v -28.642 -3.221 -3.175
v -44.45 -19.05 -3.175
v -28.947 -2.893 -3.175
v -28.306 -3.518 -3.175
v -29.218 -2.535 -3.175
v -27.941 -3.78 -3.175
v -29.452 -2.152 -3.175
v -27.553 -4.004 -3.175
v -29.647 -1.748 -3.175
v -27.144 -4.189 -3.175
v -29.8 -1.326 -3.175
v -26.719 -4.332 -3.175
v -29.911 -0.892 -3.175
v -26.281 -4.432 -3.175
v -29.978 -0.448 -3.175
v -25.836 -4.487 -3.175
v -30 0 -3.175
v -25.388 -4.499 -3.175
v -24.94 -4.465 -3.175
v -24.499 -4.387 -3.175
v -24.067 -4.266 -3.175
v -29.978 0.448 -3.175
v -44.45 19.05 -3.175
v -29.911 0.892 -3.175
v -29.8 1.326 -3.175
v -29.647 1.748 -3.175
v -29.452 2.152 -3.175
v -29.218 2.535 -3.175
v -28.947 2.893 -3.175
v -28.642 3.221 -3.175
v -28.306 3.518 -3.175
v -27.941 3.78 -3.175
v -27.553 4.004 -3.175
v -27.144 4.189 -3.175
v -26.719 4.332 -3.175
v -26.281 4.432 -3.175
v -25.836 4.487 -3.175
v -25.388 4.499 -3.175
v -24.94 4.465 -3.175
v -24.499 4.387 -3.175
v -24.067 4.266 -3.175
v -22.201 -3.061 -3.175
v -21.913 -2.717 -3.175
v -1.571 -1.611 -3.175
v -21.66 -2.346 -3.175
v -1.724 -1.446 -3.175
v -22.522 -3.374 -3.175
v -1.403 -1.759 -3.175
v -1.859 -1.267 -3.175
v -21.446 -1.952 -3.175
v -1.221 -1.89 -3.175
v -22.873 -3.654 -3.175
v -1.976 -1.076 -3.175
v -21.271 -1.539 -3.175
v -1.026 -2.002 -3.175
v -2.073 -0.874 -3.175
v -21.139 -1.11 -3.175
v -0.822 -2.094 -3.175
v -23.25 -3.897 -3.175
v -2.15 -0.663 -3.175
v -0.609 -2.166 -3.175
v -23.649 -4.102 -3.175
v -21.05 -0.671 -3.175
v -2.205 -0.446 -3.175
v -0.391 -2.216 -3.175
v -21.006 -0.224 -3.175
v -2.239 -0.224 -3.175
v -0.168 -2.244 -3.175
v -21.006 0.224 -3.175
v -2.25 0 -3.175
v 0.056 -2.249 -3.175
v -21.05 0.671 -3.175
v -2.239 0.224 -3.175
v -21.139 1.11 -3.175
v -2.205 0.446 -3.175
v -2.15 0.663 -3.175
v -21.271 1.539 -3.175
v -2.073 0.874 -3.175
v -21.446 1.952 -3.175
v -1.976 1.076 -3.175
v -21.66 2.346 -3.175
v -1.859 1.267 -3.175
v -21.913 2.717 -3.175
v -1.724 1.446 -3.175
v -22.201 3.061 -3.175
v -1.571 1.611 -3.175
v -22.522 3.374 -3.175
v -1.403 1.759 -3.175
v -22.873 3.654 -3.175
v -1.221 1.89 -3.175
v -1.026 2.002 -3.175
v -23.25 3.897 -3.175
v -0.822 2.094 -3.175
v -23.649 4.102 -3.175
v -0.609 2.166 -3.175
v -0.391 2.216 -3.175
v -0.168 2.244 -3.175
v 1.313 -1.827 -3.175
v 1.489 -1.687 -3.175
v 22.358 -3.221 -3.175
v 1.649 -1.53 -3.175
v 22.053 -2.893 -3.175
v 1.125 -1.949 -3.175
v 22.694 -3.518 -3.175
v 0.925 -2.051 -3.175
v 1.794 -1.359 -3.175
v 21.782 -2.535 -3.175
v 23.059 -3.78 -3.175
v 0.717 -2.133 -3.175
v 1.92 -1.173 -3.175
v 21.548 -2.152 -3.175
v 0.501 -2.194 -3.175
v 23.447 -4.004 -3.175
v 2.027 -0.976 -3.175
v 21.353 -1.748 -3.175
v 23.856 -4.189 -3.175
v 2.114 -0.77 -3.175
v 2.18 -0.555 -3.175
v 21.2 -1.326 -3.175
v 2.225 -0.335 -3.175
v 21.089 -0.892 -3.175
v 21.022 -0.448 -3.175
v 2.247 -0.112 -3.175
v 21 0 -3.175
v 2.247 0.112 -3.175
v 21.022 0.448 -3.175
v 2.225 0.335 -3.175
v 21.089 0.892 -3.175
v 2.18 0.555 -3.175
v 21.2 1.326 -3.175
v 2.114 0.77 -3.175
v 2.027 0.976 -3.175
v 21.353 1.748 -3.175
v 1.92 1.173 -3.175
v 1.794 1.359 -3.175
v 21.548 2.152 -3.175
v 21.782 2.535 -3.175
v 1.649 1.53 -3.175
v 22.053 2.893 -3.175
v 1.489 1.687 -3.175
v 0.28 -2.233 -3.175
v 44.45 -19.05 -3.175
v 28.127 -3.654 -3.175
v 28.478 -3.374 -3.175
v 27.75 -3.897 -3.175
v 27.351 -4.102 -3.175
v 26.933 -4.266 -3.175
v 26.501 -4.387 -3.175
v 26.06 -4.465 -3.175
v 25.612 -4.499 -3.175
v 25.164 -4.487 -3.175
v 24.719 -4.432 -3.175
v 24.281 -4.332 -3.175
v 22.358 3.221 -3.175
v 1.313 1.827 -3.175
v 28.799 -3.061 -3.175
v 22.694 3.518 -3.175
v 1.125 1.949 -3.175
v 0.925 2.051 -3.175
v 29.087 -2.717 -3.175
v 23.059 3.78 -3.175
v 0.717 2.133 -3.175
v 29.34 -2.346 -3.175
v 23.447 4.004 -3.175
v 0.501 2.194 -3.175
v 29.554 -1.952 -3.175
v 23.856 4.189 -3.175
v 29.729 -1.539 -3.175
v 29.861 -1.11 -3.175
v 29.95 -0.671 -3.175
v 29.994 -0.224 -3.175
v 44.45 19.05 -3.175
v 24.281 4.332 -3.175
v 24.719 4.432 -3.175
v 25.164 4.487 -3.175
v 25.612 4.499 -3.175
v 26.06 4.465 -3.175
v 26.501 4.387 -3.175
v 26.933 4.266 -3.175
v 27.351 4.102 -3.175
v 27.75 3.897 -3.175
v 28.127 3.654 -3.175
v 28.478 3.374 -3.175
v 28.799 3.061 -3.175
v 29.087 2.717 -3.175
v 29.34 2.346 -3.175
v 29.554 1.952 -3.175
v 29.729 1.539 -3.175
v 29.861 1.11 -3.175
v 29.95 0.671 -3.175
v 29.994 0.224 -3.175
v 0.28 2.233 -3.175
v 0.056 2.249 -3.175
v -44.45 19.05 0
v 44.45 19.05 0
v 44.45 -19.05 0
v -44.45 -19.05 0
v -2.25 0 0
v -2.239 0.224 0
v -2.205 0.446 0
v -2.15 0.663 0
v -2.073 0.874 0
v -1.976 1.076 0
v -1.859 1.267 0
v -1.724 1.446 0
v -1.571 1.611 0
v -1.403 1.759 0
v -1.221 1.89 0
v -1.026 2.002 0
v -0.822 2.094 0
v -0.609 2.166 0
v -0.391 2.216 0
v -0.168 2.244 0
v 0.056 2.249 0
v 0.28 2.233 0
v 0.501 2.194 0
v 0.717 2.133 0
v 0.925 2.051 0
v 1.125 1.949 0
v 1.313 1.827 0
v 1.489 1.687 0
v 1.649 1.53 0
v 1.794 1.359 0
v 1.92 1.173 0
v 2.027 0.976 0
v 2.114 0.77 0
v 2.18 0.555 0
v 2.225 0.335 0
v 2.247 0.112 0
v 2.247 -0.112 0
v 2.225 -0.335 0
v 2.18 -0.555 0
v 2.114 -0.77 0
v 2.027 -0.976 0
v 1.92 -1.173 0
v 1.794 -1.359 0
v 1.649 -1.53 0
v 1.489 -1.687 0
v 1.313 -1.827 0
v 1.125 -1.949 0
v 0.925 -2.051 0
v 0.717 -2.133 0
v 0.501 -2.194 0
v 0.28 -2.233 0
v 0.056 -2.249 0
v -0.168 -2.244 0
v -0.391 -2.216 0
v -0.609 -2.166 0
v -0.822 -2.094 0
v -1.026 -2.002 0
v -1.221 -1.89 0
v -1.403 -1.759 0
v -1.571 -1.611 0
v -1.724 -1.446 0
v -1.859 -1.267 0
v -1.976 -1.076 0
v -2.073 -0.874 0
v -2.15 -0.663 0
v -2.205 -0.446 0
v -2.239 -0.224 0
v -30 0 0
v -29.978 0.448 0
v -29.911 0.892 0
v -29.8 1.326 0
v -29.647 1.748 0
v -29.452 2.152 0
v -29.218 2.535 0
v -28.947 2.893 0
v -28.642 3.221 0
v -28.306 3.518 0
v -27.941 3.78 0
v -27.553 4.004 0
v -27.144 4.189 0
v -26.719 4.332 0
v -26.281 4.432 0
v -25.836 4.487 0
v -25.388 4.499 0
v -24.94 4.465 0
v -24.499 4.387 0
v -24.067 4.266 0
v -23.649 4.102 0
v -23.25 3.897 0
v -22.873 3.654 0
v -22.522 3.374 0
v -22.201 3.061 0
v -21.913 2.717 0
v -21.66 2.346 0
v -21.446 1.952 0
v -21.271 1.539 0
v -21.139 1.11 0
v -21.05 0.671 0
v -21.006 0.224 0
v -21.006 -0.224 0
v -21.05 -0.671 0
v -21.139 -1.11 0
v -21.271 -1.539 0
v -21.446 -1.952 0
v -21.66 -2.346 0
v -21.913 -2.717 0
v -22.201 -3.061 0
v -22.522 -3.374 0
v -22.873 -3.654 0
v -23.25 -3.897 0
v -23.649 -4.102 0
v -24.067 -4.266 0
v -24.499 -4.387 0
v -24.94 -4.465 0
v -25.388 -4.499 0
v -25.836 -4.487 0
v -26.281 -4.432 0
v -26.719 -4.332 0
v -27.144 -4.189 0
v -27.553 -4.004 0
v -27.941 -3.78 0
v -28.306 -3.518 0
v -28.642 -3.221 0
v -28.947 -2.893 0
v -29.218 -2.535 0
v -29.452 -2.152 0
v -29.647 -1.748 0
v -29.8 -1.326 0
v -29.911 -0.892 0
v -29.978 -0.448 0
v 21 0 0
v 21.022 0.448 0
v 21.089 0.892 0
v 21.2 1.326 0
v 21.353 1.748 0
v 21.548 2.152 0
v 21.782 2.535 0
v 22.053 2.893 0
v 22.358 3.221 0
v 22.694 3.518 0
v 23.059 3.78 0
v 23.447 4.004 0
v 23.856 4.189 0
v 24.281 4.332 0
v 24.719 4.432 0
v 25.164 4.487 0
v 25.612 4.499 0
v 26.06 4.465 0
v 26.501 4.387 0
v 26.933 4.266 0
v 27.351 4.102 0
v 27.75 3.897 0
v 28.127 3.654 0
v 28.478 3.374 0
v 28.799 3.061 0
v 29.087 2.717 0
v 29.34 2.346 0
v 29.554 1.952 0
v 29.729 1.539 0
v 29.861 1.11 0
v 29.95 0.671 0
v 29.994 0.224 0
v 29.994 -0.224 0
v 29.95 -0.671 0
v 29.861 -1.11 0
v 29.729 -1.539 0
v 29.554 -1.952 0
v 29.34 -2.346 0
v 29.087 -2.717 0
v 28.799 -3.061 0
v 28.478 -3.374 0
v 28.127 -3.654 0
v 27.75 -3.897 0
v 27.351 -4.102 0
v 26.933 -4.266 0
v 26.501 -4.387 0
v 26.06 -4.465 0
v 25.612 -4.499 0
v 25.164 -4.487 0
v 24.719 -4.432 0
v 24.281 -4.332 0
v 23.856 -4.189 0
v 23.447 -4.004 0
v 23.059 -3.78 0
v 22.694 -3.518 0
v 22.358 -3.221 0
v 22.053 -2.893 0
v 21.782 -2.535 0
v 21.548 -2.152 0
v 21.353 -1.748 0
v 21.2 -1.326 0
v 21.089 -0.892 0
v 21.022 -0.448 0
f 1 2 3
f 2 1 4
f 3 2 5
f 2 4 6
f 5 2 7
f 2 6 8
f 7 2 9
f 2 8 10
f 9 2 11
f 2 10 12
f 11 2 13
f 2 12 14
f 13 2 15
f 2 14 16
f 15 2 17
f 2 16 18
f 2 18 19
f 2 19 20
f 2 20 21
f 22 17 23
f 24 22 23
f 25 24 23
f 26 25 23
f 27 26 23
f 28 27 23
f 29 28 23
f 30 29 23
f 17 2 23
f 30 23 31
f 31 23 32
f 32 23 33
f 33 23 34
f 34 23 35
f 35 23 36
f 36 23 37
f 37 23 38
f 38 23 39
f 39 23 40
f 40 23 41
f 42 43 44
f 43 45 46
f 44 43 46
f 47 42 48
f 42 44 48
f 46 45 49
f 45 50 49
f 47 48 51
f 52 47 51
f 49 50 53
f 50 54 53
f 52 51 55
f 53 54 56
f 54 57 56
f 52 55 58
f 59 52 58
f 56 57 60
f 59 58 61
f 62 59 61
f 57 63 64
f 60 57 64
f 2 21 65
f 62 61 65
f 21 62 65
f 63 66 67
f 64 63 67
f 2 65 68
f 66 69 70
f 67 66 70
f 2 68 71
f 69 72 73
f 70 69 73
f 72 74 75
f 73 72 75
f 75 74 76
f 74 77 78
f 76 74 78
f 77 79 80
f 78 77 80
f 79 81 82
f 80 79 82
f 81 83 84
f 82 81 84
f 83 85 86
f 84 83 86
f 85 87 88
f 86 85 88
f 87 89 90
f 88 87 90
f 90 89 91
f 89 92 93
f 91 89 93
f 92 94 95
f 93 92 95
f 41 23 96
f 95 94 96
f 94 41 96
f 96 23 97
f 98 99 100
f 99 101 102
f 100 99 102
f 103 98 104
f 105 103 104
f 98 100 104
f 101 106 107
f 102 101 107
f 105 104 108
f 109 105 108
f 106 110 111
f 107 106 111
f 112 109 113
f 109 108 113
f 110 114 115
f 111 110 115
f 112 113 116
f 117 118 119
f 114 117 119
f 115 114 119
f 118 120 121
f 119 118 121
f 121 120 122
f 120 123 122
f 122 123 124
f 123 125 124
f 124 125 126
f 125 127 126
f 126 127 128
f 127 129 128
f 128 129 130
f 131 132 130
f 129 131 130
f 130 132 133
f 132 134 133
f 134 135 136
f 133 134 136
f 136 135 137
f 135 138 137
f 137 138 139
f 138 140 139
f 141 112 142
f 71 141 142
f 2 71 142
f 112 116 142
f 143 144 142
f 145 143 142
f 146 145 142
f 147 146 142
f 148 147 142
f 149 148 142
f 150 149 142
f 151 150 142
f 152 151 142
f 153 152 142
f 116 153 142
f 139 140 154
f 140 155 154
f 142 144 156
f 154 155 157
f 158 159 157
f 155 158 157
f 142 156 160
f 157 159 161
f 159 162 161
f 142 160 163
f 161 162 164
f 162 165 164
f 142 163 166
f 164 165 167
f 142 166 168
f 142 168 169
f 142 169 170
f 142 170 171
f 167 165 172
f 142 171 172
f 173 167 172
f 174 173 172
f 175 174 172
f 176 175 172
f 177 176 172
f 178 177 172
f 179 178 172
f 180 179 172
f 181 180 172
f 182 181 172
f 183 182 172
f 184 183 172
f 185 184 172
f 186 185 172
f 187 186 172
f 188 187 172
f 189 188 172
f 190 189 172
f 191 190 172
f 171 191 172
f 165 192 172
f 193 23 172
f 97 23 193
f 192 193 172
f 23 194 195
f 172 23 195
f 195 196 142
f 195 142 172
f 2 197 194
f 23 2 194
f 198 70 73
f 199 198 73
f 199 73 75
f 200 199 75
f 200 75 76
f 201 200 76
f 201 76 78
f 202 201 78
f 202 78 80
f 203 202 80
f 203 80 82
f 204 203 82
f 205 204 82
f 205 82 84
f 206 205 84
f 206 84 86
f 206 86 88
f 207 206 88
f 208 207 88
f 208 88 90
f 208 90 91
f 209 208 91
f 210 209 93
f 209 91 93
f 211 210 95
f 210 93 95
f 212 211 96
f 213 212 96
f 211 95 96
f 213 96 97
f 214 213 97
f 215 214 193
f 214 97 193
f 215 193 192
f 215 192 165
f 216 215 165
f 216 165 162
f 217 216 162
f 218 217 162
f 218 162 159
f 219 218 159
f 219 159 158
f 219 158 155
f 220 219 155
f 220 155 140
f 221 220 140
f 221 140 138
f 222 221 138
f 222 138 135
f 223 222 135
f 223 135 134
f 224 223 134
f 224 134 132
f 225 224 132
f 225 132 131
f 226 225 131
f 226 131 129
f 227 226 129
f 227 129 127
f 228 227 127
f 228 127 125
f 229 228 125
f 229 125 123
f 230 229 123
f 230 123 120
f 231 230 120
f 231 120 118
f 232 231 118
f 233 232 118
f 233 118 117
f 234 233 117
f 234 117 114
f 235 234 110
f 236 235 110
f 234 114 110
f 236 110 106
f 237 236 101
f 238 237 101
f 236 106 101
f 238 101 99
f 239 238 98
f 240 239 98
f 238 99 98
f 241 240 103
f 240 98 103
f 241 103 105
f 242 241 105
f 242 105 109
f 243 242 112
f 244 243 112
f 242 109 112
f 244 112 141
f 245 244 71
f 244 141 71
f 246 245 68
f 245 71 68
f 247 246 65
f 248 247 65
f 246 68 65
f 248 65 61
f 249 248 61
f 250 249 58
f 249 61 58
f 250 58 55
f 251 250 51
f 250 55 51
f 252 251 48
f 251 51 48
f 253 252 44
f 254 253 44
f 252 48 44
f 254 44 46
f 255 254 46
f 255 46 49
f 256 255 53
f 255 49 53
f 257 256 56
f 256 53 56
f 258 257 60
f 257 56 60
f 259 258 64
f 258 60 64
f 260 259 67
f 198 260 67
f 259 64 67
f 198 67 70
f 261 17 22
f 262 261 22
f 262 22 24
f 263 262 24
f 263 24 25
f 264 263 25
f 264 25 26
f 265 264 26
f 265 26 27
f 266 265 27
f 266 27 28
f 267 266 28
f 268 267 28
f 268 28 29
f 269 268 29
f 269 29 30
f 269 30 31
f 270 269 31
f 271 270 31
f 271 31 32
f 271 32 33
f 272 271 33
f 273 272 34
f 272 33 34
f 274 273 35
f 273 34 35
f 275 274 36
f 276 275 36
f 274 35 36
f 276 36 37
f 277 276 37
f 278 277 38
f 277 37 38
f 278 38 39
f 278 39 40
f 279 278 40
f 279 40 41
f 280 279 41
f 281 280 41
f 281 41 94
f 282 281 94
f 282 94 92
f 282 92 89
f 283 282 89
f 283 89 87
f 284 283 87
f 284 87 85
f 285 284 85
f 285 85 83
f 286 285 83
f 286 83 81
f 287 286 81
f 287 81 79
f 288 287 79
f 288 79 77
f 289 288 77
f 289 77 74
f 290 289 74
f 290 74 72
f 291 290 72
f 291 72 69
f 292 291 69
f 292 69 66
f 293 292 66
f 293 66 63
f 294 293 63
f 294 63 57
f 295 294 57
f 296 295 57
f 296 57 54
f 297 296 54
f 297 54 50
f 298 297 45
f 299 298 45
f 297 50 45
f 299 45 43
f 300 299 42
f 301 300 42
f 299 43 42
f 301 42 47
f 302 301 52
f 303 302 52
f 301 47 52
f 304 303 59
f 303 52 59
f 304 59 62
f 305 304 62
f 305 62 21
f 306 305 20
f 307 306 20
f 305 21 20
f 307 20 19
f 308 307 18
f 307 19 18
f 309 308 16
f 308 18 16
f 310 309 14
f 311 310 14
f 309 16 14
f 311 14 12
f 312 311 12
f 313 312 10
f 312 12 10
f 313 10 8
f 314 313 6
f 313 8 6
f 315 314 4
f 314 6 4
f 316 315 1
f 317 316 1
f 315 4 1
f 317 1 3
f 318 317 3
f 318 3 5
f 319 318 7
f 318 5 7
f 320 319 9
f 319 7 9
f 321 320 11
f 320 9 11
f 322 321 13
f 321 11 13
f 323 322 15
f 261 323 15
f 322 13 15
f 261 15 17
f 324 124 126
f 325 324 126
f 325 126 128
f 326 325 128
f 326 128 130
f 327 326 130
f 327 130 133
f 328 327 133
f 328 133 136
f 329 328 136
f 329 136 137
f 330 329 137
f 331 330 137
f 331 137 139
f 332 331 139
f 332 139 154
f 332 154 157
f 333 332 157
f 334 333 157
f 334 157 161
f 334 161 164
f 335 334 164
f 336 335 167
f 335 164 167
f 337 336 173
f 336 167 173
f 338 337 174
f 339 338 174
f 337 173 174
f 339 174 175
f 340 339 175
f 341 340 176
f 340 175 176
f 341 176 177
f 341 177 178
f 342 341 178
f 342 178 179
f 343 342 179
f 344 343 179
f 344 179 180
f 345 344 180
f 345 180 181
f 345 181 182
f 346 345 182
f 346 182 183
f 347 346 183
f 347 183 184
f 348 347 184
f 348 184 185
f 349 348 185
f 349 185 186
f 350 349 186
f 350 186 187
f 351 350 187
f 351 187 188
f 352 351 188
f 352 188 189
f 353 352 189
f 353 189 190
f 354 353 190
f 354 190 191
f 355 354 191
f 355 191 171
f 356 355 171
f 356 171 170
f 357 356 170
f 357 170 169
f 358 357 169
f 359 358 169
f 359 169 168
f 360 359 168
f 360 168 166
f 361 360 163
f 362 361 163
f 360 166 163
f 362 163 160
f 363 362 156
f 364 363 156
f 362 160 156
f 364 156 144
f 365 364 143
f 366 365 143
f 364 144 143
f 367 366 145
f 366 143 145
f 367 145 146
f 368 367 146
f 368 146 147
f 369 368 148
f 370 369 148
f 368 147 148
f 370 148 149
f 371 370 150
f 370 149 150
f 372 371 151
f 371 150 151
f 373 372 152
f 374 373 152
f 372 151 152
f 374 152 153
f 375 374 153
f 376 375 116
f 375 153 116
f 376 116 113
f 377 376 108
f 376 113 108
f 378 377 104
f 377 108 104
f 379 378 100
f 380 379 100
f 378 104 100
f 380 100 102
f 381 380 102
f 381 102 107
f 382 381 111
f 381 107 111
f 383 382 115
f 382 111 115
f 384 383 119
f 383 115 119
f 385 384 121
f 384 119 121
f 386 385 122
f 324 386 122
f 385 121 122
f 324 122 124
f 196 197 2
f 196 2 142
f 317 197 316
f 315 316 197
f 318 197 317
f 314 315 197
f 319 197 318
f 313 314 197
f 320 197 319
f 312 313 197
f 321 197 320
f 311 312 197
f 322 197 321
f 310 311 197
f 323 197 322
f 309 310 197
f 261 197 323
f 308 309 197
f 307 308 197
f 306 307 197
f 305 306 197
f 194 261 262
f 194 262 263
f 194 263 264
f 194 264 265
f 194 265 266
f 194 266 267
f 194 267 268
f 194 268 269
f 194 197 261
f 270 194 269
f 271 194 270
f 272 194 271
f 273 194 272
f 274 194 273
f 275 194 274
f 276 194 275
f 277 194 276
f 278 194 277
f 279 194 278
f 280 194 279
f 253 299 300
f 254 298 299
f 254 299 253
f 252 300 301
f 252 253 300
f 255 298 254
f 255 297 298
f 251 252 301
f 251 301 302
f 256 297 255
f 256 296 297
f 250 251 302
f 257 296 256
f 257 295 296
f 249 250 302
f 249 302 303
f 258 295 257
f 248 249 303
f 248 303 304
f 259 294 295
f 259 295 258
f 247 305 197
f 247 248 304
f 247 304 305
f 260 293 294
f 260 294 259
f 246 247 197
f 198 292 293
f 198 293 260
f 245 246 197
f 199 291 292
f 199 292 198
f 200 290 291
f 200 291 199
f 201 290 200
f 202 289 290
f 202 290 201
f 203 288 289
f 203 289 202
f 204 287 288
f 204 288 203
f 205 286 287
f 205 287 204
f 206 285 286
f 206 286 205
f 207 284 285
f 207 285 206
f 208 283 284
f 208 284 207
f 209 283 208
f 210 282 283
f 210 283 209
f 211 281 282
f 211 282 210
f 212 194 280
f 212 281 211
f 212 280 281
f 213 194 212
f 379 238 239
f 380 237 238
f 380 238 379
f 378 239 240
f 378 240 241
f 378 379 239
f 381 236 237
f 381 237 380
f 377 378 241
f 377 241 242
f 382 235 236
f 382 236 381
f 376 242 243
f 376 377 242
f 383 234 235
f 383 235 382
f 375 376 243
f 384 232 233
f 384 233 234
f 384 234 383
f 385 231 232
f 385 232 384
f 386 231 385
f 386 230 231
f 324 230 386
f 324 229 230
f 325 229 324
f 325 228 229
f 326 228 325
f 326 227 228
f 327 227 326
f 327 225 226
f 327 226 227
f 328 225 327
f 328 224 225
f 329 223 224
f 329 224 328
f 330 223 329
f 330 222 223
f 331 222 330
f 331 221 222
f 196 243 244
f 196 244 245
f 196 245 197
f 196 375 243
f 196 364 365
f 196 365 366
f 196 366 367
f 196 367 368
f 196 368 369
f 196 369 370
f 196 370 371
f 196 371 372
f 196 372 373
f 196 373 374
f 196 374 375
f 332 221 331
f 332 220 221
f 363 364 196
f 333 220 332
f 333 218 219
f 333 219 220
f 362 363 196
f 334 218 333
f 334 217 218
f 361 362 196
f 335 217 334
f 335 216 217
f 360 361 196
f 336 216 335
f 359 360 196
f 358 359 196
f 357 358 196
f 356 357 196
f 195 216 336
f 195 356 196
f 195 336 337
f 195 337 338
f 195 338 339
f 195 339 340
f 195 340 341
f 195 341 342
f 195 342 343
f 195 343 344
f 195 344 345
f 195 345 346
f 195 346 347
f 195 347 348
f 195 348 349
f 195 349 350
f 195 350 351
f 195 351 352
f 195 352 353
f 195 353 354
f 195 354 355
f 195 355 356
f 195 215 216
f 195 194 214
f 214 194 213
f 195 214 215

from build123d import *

# Parameters (mm, degrees)
SKETCH1_W            = 88.9
SKETCH1_H            = 38.1
BOSS_EXTRUDE1_DEPTH  = 3.175
M4_CLEARANCE_HOLE1_D = 4.5
M8_CLEARANCE_HOLE1_D = 9


with BuildPart() as part:
    # Sketch1 → Boss-Extrude1 (new body)
    with BuildSketch(Plane.XY):
        Rectangle(SKETCH1_W, SKETCH1_H)
    extrude(amount=-BOSS_EXTRUDE1_DEPTH)

    # M4 Clearance Hole1 (through all)
    with Locations(Plane.XY):
        with Locations((0, 0)):
            Hole(M4_CLEARANCE_HOLE1_D / 2)

    # M8 Clearance Hole1 (through all)
    with Locations(Plane.XY):
        with Locations((-25.5, 0), (25.5, 0)):
            Hole(M8_CLEARANCE_HOLE1_D / 2)


solid = part.part
